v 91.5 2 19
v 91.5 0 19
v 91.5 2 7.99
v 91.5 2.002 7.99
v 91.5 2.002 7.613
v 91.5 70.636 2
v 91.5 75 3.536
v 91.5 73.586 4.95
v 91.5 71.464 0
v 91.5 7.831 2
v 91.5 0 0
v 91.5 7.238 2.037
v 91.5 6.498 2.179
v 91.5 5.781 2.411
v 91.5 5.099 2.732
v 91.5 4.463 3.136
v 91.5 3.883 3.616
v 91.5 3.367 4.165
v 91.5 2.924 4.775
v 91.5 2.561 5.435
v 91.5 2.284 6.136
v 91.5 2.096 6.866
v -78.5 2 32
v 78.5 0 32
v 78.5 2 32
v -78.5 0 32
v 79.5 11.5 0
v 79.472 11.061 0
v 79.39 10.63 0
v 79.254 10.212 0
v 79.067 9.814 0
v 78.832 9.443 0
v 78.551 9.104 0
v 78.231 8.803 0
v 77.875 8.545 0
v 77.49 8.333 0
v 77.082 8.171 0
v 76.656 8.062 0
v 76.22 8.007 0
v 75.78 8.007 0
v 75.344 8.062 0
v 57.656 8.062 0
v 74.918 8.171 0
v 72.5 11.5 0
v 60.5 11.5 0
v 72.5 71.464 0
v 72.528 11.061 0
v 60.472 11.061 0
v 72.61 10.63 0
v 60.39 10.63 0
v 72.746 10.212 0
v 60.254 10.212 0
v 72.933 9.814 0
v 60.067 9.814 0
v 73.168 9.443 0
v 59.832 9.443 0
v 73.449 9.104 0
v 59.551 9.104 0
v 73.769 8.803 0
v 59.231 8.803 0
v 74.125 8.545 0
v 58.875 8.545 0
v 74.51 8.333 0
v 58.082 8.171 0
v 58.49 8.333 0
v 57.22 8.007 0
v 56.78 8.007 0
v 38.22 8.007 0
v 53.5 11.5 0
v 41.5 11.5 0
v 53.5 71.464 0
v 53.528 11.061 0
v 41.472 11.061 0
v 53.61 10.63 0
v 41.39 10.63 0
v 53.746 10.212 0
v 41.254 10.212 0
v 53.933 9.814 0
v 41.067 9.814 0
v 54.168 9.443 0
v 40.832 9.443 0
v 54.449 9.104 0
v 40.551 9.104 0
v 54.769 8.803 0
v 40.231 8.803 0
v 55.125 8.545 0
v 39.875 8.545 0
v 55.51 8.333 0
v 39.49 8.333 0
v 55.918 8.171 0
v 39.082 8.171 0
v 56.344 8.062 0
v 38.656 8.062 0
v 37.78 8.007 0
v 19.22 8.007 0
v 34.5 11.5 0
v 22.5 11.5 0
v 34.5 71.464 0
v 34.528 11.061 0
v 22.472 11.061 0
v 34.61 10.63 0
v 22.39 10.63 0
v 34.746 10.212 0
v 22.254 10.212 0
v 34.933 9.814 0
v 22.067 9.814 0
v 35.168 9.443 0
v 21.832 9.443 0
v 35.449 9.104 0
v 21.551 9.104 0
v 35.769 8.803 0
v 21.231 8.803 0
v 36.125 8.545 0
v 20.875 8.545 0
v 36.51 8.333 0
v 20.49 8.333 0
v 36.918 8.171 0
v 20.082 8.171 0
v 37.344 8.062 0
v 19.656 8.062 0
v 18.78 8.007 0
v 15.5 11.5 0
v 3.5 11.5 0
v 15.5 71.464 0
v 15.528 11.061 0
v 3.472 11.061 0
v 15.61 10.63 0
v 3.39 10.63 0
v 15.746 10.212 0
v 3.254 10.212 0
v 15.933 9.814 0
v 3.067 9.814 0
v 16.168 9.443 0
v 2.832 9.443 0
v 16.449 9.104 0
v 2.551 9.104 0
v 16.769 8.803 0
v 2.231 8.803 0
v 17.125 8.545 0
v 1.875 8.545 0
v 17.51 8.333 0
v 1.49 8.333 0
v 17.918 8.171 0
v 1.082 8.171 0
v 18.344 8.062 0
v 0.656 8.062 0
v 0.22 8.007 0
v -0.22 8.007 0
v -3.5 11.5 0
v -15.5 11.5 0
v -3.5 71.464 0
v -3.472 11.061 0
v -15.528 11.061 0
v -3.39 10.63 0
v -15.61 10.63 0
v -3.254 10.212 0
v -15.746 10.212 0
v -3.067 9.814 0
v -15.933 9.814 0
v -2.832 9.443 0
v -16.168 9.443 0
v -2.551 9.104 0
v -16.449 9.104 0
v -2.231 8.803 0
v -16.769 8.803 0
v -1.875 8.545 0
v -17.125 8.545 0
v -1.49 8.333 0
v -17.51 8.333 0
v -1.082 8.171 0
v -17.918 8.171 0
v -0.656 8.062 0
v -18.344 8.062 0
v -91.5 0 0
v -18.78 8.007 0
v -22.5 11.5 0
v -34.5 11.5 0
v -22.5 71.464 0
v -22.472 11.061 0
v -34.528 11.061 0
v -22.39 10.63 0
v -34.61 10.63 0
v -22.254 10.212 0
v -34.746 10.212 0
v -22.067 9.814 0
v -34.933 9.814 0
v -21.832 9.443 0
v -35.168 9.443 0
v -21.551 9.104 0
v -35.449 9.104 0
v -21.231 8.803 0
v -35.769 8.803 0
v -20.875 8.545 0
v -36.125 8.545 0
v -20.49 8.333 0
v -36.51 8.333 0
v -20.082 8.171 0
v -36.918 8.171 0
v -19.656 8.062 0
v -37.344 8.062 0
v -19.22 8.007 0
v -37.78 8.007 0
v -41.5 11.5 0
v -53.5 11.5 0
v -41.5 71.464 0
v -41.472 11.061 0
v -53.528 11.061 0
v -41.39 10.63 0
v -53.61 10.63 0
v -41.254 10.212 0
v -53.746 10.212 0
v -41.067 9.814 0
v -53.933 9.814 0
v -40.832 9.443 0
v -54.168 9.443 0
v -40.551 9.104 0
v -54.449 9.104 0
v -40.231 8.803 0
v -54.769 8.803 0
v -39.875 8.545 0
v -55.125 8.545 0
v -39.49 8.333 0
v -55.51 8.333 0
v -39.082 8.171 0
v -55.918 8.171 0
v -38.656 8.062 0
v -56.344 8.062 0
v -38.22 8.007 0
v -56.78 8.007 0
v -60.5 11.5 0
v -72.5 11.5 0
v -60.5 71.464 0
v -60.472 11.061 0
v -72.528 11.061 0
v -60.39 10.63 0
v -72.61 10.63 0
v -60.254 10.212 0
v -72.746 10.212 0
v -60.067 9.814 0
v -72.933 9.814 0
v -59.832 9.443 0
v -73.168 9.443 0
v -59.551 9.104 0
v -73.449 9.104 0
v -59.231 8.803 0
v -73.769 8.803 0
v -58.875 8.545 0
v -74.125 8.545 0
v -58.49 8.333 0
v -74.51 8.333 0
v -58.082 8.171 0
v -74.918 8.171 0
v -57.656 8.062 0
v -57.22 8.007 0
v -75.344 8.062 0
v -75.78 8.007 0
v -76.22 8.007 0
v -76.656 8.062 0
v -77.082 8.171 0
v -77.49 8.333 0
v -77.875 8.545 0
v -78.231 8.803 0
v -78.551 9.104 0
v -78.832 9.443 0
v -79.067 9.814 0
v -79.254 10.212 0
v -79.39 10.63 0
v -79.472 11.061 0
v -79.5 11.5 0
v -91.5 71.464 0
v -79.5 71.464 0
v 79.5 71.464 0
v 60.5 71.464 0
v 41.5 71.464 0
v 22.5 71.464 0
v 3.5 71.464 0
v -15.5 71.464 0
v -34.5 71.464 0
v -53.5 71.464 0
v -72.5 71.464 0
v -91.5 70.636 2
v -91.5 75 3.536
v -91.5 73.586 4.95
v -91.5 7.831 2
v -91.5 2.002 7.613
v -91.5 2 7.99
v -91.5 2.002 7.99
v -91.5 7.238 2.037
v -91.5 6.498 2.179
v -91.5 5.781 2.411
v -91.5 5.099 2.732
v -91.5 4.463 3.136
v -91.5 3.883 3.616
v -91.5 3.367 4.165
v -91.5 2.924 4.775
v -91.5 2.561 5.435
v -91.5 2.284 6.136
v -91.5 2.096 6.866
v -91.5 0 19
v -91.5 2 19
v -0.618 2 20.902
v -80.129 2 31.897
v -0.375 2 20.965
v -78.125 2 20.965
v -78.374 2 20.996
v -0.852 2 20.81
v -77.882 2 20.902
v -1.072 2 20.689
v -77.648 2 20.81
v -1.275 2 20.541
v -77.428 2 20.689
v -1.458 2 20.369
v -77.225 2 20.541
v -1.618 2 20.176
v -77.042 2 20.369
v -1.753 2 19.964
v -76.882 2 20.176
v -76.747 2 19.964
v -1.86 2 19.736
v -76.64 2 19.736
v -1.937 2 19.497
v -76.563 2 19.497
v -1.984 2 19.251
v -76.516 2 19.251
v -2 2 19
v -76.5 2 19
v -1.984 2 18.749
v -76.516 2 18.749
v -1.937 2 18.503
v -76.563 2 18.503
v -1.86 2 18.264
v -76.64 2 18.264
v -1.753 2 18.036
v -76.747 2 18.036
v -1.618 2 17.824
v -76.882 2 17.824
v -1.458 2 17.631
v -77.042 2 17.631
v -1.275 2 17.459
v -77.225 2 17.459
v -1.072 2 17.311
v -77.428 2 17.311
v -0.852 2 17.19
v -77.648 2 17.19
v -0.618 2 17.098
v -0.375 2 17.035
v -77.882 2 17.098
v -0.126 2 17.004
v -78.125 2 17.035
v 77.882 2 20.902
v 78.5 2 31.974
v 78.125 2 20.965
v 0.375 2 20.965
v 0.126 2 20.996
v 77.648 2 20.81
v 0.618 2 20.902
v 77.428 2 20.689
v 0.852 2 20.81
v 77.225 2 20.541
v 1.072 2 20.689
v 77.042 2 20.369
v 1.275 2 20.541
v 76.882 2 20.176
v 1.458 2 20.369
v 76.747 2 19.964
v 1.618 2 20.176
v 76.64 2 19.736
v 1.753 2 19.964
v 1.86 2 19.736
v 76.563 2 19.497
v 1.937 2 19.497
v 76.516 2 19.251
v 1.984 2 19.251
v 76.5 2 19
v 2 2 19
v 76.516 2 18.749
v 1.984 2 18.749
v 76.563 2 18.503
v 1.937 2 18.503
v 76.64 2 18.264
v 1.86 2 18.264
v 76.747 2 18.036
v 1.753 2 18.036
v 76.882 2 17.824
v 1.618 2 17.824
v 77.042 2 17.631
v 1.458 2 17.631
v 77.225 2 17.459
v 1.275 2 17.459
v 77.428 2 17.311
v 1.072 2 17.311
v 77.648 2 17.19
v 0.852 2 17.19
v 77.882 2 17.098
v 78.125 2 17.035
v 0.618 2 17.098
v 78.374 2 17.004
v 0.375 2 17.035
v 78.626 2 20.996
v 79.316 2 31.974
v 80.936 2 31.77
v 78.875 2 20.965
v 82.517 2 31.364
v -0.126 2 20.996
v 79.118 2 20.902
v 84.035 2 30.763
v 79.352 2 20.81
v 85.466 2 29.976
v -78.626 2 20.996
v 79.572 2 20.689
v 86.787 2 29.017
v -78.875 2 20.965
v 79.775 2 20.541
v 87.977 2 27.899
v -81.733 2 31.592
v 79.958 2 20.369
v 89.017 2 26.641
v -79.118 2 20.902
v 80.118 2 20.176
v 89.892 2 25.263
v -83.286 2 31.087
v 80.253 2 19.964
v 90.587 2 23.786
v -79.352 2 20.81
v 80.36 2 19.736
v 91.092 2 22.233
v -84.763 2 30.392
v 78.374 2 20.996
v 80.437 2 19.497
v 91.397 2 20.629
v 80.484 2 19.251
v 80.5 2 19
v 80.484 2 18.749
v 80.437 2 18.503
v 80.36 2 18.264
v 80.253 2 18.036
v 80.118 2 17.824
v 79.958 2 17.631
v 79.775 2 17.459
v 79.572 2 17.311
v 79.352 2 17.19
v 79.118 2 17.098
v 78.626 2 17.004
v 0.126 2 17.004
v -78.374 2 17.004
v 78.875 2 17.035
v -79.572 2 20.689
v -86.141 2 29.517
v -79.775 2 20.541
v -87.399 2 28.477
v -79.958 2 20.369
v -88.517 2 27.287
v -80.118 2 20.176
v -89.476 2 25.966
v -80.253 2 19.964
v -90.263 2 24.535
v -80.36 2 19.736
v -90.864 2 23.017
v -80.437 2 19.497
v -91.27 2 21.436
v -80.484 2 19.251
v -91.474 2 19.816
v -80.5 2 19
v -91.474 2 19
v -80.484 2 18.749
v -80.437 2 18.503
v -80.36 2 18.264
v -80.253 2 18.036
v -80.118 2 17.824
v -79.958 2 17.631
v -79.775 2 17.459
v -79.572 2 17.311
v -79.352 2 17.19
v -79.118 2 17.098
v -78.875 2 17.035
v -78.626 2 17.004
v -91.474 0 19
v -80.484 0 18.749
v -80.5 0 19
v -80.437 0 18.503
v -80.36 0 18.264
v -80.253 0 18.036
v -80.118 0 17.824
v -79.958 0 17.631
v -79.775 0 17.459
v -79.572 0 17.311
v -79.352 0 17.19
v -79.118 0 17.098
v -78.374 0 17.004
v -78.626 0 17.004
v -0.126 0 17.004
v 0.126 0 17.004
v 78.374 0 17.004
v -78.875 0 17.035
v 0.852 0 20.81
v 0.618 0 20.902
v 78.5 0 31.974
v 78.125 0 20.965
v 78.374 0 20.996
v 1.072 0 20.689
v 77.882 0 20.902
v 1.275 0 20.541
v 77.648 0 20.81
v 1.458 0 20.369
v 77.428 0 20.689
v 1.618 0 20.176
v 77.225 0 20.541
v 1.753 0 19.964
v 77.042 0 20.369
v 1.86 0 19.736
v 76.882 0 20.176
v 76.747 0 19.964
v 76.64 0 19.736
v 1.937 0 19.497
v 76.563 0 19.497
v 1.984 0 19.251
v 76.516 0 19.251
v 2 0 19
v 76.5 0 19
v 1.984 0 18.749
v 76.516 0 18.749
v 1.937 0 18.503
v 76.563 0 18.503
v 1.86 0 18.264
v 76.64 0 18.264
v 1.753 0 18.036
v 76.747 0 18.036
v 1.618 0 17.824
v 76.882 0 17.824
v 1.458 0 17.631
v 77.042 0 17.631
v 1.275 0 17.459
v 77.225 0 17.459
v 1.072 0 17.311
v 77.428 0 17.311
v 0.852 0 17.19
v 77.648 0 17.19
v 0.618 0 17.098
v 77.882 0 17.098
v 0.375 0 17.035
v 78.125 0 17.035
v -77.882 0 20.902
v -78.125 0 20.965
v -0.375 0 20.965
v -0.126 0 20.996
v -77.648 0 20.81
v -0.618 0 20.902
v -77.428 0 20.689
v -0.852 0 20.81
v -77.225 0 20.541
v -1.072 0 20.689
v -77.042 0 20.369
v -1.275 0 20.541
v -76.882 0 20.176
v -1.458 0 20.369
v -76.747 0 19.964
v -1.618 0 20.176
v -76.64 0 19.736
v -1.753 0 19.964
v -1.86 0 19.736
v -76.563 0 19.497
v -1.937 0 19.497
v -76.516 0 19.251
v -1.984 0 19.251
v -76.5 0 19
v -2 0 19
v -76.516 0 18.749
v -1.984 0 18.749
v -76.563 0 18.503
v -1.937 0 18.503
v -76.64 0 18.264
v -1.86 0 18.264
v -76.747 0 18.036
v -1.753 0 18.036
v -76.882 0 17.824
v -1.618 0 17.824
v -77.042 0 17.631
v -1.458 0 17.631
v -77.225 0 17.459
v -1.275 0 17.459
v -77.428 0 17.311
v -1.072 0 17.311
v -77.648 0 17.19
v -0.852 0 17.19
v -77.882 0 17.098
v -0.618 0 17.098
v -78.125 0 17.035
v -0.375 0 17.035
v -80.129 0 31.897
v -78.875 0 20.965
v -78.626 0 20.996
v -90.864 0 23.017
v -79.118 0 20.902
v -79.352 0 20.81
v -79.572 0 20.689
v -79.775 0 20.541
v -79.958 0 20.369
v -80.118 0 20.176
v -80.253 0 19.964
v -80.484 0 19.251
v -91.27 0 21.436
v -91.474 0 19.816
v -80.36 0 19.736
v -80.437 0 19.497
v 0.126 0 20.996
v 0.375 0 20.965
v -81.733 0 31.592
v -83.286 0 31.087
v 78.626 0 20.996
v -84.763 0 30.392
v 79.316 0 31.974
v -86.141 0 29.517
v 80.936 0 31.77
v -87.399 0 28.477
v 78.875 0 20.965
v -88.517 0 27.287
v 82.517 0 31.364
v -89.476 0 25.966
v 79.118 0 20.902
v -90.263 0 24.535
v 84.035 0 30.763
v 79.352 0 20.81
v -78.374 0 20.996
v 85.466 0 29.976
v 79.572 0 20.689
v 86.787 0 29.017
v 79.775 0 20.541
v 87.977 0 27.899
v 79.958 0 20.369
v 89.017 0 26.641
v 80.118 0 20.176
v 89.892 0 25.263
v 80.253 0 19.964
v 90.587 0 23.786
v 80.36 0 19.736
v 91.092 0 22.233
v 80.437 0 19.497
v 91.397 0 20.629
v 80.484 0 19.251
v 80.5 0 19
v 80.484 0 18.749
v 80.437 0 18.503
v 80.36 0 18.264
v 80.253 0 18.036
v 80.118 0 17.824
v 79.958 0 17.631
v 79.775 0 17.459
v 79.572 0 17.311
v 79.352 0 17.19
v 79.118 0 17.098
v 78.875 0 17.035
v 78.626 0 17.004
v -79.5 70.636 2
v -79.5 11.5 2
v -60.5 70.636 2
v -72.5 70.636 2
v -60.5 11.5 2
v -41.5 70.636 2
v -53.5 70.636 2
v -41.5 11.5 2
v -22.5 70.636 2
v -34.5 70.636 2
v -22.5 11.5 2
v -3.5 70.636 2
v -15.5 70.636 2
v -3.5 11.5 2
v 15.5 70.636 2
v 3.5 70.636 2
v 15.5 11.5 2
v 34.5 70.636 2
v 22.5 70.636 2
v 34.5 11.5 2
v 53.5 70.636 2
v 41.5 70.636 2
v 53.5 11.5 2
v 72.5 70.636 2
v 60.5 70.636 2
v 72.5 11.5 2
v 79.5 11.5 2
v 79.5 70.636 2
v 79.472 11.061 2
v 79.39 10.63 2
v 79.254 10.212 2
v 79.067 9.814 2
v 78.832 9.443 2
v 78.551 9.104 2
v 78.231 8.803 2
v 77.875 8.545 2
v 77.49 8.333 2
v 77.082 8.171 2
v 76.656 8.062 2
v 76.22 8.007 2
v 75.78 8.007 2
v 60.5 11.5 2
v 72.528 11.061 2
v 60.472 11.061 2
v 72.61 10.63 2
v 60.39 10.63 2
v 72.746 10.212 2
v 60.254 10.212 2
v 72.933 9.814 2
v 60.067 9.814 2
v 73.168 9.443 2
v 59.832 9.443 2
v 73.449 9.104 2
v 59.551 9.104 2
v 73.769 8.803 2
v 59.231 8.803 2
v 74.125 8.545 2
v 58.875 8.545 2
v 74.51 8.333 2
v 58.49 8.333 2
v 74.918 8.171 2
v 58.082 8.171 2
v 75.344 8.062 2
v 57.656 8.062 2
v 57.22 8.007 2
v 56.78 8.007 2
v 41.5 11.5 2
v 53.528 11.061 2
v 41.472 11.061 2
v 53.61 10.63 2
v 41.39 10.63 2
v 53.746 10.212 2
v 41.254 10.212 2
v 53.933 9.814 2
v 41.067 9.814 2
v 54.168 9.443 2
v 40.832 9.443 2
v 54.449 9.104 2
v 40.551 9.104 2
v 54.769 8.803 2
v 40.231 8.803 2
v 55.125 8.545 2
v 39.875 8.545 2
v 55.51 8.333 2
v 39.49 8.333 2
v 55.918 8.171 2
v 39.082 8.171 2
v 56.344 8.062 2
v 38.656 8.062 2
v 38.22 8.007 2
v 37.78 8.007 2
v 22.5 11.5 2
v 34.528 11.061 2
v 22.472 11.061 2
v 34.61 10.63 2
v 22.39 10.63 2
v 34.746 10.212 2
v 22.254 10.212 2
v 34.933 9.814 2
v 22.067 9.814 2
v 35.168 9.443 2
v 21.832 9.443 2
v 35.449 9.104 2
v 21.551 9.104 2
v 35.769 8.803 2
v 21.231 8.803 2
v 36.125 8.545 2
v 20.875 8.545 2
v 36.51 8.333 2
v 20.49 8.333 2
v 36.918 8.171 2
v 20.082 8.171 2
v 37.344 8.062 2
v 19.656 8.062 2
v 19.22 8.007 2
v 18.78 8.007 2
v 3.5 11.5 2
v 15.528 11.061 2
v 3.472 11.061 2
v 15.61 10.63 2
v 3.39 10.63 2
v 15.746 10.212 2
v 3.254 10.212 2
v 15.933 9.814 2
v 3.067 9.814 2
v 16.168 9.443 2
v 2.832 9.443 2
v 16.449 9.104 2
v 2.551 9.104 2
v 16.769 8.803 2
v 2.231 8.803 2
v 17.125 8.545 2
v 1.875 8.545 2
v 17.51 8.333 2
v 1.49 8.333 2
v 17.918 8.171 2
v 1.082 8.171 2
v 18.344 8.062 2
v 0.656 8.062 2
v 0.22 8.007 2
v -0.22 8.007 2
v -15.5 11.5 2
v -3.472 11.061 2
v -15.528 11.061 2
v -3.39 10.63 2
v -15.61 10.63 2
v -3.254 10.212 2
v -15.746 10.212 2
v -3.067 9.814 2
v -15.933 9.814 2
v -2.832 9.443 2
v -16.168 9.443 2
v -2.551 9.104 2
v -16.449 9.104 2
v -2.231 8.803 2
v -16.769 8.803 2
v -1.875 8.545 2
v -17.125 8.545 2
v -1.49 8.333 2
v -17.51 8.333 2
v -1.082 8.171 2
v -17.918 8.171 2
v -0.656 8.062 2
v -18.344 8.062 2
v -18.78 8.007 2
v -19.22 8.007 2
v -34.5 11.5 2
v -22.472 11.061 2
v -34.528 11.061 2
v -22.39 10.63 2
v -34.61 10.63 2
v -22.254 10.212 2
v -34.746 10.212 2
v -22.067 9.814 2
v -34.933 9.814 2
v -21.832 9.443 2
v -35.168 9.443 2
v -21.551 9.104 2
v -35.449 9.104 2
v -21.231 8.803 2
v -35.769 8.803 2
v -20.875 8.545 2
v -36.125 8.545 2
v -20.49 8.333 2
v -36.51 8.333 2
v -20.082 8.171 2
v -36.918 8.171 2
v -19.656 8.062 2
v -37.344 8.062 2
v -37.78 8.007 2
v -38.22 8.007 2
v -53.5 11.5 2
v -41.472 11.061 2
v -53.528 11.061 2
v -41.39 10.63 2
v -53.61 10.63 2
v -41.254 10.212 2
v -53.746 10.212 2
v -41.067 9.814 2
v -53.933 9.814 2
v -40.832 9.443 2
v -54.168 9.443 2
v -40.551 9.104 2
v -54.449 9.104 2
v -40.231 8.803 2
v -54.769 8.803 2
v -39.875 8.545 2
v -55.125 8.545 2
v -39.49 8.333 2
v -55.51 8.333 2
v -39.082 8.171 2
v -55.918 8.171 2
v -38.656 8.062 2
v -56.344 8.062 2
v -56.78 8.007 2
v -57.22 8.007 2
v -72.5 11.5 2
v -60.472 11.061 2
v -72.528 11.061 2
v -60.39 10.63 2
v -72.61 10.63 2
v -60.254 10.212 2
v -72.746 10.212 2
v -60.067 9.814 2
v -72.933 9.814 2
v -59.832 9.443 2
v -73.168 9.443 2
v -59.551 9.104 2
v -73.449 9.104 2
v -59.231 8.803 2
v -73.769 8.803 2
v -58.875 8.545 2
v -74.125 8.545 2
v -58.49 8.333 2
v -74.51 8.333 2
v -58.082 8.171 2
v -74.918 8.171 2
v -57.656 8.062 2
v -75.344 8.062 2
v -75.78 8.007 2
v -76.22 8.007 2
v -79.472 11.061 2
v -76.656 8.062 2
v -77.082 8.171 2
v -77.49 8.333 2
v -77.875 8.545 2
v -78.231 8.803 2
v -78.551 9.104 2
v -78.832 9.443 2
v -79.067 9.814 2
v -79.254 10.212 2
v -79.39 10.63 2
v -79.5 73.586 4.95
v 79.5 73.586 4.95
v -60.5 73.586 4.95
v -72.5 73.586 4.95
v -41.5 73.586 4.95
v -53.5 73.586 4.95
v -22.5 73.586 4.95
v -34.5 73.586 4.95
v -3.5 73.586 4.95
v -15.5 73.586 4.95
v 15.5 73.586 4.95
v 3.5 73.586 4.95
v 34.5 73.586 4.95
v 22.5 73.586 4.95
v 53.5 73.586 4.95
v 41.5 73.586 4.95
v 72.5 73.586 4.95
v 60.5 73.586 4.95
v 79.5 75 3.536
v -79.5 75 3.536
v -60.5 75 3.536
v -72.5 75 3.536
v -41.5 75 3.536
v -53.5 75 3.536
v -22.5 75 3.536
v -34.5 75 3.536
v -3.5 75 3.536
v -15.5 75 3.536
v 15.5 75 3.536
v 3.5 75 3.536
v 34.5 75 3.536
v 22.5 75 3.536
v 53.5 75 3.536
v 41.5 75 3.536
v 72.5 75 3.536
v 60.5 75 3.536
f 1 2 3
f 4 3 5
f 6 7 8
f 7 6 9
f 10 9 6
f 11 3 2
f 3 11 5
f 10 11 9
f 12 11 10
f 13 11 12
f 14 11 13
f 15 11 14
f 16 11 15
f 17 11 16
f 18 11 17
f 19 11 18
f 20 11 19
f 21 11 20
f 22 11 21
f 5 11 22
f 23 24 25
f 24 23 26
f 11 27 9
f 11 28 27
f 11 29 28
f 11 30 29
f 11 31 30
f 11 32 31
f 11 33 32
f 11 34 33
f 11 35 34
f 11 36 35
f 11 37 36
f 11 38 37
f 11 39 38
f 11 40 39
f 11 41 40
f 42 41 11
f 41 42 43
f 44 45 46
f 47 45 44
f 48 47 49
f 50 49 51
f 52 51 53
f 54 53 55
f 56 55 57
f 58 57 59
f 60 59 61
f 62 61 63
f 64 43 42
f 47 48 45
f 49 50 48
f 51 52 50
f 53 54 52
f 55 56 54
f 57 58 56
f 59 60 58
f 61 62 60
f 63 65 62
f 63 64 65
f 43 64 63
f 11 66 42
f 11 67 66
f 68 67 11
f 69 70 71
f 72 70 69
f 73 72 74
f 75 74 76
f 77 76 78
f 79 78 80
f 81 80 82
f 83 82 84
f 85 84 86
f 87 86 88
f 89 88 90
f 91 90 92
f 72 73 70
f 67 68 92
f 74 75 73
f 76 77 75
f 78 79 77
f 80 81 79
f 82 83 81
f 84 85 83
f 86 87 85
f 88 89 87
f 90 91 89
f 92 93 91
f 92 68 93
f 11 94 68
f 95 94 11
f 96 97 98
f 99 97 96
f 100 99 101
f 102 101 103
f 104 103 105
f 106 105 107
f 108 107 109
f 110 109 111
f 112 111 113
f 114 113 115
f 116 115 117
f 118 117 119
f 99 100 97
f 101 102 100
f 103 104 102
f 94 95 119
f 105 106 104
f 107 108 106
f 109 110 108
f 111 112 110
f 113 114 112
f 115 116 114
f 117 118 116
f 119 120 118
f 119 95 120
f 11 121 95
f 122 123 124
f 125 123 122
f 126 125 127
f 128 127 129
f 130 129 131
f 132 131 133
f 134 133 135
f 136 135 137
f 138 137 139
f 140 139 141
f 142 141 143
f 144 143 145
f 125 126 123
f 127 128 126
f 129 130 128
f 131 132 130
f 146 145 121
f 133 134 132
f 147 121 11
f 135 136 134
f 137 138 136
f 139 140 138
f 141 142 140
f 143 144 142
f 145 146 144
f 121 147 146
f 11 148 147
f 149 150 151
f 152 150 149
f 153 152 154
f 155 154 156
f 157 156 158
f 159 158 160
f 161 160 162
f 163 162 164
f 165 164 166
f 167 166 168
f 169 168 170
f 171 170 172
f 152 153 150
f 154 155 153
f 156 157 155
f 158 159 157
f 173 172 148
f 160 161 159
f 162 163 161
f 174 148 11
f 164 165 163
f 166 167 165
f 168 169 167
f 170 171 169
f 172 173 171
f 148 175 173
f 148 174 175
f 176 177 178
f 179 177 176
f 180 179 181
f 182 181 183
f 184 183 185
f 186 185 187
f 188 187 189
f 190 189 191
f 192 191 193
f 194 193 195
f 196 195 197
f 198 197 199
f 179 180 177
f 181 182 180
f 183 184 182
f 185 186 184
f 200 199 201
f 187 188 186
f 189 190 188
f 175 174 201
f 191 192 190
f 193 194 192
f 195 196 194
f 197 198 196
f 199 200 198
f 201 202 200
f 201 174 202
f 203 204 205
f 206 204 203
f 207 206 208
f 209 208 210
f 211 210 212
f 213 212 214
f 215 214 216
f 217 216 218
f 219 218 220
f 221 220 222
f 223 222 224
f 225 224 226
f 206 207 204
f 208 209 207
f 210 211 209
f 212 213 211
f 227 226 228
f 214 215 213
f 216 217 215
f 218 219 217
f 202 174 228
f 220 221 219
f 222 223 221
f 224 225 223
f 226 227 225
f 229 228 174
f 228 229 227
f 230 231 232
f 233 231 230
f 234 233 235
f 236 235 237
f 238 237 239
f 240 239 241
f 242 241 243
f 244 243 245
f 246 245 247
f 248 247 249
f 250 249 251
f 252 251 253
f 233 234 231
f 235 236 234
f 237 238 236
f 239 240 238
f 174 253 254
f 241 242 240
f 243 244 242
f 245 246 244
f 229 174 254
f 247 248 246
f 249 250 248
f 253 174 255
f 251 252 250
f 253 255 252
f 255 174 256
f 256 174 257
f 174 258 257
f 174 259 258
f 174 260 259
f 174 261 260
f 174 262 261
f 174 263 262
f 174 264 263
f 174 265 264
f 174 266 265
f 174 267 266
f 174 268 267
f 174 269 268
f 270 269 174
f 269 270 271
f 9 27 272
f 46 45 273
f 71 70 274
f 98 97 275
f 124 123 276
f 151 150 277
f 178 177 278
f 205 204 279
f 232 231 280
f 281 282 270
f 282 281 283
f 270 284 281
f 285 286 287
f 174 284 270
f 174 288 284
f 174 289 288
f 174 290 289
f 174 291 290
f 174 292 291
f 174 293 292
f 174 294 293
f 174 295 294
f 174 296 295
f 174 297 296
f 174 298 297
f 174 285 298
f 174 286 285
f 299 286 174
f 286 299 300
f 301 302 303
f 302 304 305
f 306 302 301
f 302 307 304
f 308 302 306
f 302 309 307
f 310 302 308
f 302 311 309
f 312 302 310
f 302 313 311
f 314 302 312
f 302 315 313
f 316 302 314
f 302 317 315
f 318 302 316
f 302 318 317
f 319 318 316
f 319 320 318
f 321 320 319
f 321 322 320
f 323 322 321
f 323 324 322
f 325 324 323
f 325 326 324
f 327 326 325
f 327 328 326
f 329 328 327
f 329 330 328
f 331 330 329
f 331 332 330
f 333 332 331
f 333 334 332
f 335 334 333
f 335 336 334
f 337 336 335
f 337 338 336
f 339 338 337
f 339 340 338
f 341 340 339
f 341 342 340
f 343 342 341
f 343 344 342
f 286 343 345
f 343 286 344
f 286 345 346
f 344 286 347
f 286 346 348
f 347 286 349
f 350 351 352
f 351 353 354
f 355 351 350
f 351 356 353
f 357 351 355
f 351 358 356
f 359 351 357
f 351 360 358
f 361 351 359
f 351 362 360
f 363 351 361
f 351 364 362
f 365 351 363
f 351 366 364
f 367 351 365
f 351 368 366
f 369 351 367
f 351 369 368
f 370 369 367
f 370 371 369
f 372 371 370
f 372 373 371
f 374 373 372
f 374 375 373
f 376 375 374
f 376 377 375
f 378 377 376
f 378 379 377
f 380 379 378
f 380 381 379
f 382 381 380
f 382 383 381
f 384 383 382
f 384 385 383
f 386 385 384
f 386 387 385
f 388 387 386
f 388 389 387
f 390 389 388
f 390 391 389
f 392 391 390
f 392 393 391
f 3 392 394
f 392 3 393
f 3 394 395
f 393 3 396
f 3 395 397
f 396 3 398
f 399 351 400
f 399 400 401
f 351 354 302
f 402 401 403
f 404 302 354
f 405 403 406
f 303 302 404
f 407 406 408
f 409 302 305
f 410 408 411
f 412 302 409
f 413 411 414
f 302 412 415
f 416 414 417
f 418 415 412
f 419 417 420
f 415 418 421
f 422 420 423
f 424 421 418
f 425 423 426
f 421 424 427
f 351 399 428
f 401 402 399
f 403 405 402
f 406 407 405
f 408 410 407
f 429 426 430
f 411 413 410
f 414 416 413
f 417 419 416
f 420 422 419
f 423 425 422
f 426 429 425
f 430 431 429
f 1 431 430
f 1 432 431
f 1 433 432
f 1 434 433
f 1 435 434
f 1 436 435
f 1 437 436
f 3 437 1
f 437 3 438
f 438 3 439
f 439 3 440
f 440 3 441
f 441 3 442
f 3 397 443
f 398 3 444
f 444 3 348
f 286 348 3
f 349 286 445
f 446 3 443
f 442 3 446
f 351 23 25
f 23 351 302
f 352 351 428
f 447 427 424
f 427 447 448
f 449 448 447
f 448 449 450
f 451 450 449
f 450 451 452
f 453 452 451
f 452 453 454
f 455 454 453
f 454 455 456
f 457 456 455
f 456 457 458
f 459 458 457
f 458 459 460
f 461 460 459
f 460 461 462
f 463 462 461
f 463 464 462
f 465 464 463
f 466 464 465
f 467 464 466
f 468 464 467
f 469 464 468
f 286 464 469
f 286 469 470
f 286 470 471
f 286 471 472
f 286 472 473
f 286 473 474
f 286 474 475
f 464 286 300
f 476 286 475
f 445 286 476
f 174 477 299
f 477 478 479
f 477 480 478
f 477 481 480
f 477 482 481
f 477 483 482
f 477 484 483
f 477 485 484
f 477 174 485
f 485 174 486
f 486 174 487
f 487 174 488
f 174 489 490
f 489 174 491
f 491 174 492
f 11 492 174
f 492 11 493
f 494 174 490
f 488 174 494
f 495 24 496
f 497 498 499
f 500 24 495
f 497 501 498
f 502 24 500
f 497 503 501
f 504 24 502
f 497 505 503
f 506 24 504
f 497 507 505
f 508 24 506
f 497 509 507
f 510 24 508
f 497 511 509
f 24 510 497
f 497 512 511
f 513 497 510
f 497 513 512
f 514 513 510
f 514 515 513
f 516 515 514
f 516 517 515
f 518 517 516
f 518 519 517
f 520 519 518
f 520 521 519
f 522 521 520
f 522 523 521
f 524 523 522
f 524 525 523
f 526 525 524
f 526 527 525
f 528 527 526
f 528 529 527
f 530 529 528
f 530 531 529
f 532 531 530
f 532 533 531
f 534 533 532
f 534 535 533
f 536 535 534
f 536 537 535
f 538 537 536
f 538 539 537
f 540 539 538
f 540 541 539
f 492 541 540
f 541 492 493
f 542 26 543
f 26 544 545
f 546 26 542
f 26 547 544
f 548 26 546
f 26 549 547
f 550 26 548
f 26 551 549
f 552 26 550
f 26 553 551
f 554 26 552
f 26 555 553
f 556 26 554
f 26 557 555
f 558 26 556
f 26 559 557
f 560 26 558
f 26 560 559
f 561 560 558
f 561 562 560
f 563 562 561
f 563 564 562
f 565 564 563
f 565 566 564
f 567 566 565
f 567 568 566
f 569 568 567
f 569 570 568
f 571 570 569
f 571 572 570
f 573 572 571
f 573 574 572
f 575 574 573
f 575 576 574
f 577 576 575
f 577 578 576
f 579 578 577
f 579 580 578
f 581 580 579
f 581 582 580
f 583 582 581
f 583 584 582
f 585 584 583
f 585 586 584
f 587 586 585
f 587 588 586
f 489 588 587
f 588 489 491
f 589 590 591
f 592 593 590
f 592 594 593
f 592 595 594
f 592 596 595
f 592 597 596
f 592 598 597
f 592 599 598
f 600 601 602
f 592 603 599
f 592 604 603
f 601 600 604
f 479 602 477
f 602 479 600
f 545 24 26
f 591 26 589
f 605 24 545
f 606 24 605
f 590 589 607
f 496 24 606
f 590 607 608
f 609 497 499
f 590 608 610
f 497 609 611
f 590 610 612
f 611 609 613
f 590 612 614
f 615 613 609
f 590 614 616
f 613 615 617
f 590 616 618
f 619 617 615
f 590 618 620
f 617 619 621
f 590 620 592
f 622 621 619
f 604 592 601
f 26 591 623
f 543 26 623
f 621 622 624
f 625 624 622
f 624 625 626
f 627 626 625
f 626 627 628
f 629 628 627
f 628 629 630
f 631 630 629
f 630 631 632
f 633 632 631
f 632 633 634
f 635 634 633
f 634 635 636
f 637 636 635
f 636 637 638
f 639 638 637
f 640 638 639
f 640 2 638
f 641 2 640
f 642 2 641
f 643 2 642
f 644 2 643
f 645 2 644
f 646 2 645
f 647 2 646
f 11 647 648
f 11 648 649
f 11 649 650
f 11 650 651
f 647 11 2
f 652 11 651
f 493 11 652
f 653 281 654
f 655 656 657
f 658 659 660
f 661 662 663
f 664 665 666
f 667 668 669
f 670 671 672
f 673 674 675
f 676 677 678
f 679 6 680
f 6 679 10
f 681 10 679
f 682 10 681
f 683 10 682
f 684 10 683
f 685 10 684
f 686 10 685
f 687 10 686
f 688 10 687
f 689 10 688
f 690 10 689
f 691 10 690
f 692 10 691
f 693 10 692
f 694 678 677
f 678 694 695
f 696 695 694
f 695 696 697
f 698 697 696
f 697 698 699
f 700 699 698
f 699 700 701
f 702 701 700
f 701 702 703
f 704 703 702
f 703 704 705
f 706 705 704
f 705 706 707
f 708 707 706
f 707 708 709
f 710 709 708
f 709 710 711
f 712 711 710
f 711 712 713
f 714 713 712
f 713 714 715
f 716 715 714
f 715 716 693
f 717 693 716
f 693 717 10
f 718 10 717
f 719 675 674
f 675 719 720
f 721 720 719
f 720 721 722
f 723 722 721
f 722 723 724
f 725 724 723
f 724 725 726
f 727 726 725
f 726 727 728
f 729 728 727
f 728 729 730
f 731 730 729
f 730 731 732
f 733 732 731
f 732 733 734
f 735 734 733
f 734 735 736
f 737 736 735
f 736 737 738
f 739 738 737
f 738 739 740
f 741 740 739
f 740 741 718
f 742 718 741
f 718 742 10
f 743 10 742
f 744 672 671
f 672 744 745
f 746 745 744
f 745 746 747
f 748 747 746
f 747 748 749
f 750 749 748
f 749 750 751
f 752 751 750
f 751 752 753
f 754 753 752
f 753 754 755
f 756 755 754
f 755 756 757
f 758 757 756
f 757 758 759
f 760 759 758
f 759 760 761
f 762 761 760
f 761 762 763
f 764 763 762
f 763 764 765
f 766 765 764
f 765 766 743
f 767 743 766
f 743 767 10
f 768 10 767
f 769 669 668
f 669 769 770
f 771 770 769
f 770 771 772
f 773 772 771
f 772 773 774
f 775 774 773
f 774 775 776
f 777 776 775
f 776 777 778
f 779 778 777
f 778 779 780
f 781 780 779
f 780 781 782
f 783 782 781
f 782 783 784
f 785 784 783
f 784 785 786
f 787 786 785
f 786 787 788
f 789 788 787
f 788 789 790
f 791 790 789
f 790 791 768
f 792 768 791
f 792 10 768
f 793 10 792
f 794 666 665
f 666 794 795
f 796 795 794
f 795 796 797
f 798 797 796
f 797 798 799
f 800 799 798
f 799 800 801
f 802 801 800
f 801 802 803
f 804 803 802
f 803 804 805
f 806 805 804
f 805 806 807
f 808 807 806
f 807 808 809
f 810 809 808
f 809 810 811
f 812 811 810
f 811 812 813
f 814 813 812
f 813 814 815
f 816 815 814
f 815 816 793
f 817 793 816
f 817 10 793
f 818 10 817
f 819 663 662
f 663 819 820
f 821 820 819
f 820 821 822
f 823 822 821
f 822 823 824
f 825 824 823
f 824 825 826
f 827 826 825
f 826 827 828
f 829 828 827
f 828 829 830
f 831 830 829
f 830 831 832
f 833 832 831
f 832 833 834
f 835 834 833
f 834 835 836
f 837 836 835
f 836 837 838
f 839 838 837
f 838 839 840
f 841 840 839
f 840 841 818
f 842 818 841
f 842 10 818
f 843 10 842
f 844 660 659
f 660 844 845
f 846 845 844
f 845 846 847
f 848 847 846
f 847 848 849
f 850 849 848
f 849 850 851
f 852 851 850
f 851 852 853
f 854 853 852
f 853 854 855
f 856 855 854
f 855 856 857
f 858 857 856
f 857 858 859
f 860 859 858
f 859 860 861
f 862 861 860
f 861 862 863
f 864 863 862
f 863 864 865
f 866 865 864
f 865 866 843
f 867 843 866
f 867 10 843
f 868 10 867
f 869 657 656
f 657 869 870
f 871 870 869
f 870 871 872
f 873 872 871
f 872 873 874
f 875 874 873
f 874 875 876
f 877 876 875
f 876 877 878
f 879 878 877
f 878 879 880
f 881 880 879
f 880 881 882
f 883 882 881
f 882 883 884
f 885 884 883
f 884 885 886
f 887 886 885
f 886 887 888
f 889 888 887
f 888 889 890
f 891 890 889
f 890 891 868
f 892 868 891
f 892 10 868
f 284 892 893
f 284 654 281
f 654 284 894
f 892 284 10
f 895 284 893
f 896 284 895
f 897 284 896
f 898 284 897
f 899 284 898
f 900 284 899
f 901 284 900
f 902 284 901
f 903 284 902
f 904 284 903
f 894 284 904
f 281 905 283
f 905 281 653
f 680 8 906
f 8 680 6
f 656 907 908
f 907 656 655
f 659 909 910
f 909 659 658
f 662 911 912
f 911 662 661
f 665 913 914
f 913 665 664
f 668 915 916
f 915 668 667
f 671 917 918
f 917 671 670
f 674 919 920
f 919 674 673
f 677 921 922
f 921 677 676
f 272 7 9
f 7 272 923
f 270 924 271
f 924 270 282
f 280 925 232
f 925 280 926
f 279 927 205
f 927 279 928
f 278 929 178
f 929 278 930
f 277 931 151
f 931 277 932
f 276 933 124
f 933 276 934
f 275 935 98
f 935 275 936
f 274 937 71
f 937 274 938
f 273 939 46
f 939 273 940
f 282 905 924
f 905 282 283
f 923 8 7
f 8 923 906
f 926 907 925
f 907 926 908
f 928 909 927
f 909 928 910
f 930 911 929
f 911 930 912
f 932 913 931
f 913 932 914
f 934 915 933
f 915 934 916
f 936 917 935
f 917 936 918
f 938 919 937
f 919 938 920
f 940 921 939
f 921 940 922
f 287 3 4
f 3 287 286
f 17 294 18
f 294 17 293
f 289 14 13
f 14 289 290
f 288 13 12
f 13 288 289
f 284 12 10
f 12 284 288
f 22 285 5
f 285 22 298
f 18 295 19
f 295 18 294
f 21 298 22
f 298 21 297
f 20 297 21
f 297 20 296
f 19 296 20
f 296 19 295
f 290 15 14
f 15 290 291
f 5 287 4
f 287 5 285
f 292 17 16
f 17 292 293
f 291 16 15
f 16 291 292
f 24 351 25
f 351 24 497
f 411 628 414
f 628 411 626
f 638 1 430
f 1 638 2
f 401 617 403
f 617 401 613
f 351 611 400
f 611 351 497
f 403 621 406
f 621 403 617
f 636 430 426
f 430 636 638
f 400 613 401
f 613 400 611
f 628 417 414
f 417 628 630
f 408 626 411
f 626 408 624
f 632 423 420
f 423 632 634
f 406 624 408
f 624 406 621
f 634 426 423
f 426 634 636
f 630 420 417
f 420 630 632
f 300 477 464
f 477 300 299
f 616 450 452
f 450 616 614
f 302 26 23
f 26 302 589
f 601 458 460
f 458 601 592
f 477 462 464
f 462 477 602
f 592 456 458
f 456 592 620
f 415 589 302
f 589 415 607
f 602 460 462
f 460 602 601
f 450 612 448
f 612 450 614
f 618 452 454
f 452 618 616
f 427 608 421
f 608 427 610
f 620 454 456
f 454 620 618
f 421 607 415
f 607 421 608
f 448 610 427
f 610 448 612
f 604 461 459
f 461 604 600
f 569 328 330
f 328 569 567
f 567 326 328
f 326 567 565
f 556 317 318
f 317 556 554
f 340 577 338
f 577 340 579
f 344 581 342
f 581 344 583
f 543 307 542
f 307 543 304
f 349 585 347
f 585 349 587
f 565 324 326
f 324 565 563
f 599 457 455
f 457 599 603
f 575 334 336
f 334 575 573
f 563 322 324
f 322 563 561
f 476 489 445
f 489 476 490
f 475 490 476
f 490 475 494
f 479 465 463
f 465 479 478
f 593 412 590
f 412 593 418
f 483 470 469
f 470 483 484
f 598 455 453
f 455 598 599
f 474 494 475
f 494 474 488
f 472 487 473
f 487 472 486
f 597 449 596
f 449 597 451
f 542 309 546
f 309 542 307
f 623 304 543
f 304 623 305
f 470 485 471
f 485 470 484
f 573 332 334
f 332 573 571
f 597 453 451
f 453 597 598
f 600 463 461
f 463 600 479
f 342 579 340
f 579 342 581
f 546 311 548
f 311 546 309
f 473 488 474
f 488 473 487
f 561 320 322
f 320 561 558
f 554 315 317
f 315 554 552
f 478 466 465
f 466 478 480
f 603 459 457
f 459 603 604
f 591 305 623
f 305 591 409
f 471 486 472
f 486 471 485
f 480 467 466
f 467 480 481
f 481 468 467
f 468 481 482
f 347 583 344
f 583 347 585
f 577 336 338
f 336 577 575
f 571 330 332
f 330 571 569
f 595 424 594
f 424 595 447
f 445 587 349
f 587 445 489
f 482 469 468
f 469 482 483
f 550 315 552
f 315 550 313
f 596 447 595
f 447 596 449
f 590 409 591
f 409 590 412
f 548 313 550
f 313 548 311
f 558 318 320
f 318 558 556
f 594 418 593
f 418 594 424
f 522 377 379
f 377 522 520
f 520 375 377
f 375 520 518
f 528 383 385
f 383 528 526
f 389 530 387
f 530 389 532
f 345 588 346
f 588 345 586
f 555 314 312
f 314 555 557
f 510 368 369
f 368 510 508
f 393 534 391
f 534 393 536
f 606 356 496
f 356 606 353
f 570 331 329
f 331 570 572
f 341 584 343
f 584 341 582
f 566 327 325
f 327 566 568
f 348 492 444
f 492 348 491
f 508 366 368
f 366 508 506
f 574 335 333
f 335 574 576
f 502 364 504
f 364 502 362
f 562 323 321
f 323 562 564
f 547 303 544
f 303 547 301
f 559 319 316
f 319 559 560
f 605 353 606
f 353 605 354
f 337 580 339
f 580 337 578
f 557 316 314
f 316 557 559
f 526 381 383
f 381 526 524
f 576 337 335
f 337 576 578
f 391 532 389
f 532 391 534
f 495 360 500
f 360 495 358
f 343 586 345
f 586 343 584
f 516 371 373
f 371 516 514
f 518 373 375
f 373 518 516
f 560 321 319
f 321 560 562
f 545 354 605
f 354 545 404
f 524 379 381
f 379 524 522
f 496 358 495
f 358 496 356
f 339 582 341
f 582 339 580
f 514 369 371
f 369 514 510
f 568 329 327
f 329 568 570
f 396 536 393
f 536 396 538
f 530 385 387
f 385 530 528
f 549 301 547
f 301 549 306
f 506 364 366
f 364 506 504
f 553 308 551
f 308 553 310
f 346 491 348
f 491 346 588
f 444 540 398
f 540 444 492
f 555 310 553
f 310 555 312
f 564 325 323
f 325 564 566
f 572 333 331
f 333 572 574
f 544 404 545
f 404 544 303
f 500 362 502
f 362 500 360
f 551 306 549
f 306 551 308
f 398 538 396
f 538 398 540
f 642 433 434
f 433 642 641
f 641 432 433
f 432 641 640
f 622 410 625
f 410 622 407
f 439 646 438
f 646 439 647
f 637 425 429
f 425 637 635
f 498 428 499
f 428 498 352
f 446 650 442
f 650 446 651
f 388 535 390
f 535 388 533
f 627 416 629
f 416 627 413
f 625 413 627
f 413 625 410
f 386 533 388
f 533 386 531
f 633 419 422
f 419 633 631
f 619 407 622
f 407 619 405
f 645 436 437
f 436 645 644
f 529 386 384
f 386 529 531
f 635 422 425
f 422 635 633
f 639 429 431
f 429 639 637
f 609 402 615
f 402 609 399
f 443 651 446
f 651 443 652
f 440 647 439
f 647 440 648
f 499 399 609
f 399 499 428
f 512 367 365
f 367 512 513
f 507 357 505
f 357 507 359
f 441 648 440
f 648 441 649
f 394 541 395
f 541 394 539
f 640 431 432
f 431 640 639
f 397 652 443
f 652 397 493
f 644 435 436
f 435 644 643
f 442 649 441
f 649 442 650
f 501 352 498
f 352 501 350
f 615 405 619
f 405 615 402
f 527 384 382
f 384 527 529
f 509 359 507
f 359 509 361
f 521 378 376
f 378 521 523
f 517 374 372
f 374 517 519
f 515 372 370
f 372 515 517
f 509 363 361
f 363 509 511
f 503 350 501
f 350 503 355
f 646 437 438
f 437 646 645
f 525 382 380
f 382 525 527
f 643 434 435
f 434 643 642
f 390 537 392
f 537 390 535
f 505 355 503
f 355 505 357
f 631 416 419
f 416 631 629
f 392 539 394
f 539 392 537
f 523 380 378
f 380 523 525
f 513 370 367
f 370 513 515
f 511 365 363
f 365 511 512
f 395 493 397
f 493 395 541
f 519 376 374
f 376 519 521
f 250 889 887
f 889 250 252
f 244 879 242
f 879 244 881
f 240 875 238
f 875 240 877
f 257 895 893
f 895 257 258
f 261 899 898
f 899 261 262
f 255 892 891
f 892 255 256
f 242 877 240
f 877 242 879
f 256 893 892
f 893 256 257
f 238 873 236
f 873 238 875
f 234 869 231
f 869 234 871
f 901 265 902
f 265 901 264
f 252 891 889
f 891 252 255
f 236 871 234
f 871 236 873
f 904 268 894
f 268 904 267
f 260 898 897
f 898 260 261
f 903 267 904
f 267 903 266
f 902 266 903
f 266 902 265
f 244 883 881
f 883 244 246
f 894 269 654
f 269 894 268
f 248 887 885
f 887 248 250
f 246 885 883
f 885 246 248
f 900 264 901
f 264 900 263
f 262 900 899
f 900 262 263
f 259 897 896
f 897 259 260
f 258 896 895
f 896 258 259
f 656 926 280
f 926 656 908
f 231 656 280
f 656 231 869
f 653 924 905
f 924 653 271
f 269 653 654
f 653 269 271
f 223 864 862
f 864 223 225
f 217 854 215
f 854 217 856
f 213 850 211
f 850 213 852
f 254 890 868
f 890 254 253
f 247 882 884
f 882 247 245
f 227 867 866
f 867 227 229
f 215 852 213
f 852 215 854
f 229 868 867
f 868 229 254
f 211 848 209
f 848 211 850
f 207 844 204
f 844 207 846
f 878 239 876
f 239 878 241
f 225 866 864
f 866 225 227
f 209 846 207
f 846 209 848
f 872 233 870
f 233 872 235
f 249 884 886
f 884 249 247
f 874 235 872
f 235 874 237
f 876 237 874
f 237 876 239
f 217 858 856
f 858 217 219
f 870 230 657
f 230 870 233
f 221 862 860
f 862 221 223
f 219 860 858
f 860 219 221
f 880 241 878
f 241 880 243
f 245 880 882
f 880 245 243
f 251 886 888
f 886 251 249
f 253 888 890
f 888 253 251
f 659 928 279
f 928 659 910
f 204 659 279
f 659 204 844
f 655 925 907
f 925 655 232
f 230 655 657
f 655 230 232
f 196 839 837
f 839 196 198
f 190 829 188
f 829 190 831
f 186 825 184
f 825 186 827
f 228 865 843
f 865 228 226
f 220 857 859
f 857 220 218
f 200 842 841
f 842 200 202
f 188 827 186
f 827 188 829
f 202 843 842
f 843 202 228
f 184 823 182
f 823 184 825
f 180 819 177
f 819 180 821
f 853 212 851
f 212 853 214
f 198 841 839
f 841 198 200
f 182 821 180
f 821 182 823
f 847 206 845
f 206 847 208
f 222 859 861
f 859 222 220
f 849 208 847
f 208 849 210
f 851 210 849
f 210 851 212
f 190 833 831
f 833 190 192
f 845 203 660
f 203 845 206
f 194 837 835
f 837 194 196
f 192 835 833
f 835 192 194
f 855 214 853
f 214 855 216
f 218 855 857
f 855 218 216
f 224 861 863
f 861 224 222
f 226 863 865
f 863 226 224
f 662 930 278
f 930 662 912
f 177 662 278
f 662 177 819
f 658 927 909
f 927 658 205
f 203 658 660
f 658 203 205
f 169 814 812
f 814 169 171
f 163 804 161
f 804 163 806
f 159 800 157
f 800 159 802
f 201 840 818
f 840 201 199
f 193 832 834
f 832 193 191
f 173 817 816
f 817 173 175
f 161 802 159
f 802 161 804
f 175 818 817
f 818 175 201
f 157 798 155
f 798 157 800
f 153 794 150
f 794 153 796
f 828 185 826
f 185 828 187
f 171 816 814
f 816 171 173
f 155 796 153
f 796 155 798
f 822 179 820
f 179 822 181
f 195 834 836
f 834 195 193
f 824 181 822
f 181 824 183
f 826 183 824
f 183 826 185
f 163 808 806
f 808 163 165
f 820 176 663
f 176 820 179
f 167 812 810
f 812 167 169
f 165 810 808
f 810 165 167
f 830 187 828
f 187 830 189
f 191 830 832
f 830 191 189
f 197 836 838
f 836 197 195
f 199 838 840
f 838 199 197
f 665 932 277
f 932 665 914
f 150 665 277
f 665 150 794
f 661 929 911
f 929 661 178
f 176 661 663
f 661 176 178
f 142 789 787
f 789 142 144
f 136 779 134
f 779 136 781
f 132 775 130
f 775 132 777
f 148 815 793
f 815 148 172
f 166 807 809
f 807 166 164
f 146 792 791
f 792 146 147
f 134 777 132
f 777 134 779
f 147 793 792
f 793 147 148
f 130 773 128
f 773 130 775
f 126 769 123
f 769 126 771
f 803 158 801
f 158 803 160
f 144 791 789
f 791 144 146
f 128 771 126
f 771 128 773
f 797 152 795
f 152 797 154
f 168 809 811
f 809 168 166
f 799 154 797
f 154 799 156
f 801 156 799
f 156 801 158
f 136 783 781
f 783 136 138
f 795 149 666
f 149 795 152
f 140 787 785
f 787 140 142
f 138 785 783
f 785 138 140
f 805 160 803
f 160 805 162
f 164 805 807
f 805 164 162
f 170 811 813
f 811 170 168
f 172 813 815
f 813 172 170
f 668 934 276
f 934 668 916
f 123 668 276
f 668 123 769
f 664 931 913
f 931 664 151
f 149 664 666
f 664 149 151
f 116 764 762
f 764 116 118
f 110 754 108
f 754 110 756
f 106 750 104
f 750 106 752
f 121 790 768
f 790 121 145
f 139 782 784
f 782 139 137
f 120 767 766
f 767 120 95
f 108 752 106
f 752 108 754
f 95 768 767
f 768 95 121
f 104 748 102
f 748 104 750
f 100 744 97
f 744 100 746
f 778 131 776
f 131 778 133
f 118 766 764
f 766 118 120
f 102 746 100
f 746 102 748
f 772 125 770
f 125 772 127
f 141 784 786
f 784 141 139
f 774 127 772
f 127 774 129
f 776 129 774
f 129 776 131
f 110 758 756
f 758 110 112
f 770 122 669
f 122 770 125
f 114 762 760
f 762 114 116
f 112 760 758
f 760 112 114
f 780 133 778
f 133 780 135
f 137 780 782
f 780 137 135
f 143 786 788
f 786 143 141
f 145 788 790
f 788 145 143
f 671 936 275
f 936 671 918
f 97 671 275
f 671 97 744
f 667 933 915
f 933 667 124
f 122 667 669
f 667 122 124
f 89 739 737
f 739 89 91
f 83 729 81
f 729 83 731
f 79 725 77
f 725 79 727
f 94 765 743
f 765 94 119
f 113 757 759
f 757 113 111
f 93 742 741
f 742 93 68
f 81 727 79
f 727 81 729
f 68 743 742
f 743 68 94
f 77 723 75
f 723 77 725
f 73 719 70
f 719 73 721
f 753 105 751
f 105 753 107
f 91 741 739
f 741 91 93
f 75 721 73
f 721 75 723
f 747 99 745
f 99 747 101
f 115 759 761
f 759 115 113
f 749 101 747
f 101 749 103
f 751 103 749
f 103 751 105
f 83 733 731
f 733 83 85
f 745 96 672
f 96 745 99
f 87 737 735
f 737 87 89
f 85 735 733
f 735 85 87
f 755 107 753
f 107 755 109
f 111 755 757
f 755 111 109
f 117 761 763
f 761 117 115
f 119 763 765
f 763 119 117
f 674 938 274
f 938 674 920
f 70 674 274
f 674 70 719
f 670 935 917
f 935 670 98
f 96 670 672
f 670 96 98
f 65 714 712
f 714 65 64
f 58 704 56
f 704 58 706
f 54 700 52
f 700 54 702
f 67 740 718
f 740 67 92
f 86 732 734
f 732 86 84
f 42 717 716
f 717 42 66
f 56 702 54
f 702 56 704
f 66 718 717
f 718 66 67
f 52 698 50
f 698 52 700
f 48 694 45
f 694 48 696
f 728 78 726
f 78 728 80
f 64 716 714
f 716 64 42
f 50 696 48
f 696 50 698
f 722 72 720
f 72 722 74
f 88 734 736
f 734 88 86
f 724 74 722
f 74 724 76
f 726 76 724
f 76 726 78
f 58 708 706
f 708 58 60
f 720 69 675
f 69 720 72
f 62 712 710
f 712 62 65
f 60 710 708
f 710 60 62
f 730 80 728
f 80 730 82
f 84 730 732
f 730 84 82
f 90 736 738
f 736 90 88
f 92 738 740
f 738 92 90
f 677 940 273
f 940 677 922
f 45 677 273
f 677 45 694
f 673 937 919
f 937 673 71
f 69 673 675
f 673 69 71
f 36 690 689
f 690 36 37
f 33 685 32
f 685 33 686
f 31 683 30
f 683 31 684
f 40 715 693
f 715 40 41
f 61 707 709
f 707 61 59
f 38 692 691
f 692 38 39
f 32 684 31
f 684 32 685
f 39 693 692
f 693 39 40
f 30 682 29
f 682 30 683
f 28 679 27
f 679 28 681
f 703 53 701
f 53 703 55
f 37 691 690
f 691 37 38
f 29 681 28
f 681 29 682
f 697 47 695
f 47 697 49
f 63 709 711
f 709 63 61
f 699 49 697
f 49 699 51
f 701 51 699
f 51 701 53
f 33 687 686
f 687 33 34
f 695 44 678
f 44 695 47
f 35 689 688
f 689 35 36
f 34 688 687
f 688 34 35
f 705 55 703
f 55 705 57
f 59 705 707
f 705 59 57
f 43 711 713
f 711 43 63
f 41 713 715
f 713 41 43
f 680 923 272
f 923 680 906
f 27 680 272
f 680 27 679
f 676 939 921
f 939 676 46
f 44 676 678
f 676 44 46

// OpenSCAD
// Height of back plate
Height = 32;
// Thickness of back plate
BackThickness = 2;
// Total distance from back plate to tip of arms
Depth = 75;
// Fillet between back plate and arms for strength
FilletRadius = 6;

// Vertical thickness of Arms/Prongs
ArmThickness = 2;
// Arm Width
ArmWidth = 12;
// How much end of arm is angled above horizontal
AngleDegrees = 45;
// Length of angled portion of arms
AngledLength = 5;
// Gap between arms
SlotWidth = 7;
// How many slot for holding leads
SlotCount = 9;
// Detail
$fn = 50;

// Bolt/Screw hole style, none for adhesive mounting
HoleStyle = 1; // [0:None,1:Circular,2:Keyhole]
// Bolt thread outer diameter
BoltDiameter = 4;
// Only for "Keyhole" style
BoltHeadDiameter = 8;
// Number of mounting holes
BoltCount = 3; // [2:8]

TotalLength = SlotCount * SlotWidth + ArmWidth * (SlotCount + 1);
HoleInset = (Height - FilletRadius) / 2;
DepthLessAngle = Depth - AngledLength * cos(AngleDegrees);


module KeyHole(dlarge,dsmall,depth) {
  err = 0.01; // avoid coincident faces
  translate([0,0,-err/2]) {
    cylinder(h=depth + err,d=dsmall);
    translate([0,dlarge,0]) cylinder(h=depth + err,d=dlarge);
    translate([0,dlarge / 2, (depth + err) / 2]) cube([dsmall, dlarge, depth + err], center = true);
  }
}

module insidefillet(r, length) {
  err = 0.01;
  difference () {
   translate([0,r/2,r/2]) cube([length,r,r], center=true);
   translate([0,r,r]) rotate([0,90,0]) cylinder(h=length+2*err, r=r, center=true);
  }
}

module outsidefillet(r, length) {
  err = 0.01;
  translate([length / 2,0,0])
  difference () {
   translate([0,r,r]) cube([length+err,r*2,r*2], center=true);
   rotate([0,90,0]) cylinder(h=length+2*err, r=r, center=true);
  }
}

err = 0.01;
difference() {
  union() {
    translate([-TotalLength/2,0,0]) {
      cube([TotalLength,BackThickness,Height]);
      cube([TotalLength, DepthLessAngle, ArmThickness]);
      translate([0,DepthLessAngle]) rotate([AngleDegrees,0,0]) 
        cube([TotalLength, AngledLength, ArmThickness]);
    }
    translate([0,BackThickness-err,ArmThickness-err]) insidefillet(FilletRadius, TotalLength);
  }
  translate([TotalLength / 2 - HoleInset, 0, Height - HoleInset]) rotate([90,0,90]) 
    outsidefillet(HoleInset, BackThickness + err);
  translate([-TotalLength / 2 + HoleInset, 0, Height - HoleInset]) rotate([0,0,90]) 
    outsidefillet(HoleInset, BackThickness + err);
  
  totalBoltDistance = TotalLength - HoleInset * 2;
  for (offset = [0: totalBoltDistance / (BoltCount - 1): totalBoltDistance]) {
    if (HoleStyle == 2)
      translate([-TotalLength / 2 + HoleInset + offset, 0, Height - HoleInset]) rotate([-90,0,0]) 
        KeyHole(BoltHeadDiameter, BoltDiameter, BackThickness+FilletRadius*2);
    else if (HoleStyle == 1)
      translate([-TotalLength / 2 + HoleInset + offset, -err, Height - HoleInset]) rotate([-90,0,0]) 
        cylinder(h = BackThickness + err * 2, d = BoltDiameter);
  }
  
  for(i = [1:SlotCount]) {
    translate([-TotalLength / 2 + ArmWidth + (i-1) * (ArmWidth + SlotWidth), BackThickness + FilletRadius + SlotWidth / 2, -err])
    union() {  
      translate([SlotWidth/2, 0, 0]) cylinder(h = ArmThickness + AngledLength + err*2, d = SlotWidth);
      cube([SlotWidth, Depth, ArmThickness + AngledLength + err*2]);
    }
  }
}

